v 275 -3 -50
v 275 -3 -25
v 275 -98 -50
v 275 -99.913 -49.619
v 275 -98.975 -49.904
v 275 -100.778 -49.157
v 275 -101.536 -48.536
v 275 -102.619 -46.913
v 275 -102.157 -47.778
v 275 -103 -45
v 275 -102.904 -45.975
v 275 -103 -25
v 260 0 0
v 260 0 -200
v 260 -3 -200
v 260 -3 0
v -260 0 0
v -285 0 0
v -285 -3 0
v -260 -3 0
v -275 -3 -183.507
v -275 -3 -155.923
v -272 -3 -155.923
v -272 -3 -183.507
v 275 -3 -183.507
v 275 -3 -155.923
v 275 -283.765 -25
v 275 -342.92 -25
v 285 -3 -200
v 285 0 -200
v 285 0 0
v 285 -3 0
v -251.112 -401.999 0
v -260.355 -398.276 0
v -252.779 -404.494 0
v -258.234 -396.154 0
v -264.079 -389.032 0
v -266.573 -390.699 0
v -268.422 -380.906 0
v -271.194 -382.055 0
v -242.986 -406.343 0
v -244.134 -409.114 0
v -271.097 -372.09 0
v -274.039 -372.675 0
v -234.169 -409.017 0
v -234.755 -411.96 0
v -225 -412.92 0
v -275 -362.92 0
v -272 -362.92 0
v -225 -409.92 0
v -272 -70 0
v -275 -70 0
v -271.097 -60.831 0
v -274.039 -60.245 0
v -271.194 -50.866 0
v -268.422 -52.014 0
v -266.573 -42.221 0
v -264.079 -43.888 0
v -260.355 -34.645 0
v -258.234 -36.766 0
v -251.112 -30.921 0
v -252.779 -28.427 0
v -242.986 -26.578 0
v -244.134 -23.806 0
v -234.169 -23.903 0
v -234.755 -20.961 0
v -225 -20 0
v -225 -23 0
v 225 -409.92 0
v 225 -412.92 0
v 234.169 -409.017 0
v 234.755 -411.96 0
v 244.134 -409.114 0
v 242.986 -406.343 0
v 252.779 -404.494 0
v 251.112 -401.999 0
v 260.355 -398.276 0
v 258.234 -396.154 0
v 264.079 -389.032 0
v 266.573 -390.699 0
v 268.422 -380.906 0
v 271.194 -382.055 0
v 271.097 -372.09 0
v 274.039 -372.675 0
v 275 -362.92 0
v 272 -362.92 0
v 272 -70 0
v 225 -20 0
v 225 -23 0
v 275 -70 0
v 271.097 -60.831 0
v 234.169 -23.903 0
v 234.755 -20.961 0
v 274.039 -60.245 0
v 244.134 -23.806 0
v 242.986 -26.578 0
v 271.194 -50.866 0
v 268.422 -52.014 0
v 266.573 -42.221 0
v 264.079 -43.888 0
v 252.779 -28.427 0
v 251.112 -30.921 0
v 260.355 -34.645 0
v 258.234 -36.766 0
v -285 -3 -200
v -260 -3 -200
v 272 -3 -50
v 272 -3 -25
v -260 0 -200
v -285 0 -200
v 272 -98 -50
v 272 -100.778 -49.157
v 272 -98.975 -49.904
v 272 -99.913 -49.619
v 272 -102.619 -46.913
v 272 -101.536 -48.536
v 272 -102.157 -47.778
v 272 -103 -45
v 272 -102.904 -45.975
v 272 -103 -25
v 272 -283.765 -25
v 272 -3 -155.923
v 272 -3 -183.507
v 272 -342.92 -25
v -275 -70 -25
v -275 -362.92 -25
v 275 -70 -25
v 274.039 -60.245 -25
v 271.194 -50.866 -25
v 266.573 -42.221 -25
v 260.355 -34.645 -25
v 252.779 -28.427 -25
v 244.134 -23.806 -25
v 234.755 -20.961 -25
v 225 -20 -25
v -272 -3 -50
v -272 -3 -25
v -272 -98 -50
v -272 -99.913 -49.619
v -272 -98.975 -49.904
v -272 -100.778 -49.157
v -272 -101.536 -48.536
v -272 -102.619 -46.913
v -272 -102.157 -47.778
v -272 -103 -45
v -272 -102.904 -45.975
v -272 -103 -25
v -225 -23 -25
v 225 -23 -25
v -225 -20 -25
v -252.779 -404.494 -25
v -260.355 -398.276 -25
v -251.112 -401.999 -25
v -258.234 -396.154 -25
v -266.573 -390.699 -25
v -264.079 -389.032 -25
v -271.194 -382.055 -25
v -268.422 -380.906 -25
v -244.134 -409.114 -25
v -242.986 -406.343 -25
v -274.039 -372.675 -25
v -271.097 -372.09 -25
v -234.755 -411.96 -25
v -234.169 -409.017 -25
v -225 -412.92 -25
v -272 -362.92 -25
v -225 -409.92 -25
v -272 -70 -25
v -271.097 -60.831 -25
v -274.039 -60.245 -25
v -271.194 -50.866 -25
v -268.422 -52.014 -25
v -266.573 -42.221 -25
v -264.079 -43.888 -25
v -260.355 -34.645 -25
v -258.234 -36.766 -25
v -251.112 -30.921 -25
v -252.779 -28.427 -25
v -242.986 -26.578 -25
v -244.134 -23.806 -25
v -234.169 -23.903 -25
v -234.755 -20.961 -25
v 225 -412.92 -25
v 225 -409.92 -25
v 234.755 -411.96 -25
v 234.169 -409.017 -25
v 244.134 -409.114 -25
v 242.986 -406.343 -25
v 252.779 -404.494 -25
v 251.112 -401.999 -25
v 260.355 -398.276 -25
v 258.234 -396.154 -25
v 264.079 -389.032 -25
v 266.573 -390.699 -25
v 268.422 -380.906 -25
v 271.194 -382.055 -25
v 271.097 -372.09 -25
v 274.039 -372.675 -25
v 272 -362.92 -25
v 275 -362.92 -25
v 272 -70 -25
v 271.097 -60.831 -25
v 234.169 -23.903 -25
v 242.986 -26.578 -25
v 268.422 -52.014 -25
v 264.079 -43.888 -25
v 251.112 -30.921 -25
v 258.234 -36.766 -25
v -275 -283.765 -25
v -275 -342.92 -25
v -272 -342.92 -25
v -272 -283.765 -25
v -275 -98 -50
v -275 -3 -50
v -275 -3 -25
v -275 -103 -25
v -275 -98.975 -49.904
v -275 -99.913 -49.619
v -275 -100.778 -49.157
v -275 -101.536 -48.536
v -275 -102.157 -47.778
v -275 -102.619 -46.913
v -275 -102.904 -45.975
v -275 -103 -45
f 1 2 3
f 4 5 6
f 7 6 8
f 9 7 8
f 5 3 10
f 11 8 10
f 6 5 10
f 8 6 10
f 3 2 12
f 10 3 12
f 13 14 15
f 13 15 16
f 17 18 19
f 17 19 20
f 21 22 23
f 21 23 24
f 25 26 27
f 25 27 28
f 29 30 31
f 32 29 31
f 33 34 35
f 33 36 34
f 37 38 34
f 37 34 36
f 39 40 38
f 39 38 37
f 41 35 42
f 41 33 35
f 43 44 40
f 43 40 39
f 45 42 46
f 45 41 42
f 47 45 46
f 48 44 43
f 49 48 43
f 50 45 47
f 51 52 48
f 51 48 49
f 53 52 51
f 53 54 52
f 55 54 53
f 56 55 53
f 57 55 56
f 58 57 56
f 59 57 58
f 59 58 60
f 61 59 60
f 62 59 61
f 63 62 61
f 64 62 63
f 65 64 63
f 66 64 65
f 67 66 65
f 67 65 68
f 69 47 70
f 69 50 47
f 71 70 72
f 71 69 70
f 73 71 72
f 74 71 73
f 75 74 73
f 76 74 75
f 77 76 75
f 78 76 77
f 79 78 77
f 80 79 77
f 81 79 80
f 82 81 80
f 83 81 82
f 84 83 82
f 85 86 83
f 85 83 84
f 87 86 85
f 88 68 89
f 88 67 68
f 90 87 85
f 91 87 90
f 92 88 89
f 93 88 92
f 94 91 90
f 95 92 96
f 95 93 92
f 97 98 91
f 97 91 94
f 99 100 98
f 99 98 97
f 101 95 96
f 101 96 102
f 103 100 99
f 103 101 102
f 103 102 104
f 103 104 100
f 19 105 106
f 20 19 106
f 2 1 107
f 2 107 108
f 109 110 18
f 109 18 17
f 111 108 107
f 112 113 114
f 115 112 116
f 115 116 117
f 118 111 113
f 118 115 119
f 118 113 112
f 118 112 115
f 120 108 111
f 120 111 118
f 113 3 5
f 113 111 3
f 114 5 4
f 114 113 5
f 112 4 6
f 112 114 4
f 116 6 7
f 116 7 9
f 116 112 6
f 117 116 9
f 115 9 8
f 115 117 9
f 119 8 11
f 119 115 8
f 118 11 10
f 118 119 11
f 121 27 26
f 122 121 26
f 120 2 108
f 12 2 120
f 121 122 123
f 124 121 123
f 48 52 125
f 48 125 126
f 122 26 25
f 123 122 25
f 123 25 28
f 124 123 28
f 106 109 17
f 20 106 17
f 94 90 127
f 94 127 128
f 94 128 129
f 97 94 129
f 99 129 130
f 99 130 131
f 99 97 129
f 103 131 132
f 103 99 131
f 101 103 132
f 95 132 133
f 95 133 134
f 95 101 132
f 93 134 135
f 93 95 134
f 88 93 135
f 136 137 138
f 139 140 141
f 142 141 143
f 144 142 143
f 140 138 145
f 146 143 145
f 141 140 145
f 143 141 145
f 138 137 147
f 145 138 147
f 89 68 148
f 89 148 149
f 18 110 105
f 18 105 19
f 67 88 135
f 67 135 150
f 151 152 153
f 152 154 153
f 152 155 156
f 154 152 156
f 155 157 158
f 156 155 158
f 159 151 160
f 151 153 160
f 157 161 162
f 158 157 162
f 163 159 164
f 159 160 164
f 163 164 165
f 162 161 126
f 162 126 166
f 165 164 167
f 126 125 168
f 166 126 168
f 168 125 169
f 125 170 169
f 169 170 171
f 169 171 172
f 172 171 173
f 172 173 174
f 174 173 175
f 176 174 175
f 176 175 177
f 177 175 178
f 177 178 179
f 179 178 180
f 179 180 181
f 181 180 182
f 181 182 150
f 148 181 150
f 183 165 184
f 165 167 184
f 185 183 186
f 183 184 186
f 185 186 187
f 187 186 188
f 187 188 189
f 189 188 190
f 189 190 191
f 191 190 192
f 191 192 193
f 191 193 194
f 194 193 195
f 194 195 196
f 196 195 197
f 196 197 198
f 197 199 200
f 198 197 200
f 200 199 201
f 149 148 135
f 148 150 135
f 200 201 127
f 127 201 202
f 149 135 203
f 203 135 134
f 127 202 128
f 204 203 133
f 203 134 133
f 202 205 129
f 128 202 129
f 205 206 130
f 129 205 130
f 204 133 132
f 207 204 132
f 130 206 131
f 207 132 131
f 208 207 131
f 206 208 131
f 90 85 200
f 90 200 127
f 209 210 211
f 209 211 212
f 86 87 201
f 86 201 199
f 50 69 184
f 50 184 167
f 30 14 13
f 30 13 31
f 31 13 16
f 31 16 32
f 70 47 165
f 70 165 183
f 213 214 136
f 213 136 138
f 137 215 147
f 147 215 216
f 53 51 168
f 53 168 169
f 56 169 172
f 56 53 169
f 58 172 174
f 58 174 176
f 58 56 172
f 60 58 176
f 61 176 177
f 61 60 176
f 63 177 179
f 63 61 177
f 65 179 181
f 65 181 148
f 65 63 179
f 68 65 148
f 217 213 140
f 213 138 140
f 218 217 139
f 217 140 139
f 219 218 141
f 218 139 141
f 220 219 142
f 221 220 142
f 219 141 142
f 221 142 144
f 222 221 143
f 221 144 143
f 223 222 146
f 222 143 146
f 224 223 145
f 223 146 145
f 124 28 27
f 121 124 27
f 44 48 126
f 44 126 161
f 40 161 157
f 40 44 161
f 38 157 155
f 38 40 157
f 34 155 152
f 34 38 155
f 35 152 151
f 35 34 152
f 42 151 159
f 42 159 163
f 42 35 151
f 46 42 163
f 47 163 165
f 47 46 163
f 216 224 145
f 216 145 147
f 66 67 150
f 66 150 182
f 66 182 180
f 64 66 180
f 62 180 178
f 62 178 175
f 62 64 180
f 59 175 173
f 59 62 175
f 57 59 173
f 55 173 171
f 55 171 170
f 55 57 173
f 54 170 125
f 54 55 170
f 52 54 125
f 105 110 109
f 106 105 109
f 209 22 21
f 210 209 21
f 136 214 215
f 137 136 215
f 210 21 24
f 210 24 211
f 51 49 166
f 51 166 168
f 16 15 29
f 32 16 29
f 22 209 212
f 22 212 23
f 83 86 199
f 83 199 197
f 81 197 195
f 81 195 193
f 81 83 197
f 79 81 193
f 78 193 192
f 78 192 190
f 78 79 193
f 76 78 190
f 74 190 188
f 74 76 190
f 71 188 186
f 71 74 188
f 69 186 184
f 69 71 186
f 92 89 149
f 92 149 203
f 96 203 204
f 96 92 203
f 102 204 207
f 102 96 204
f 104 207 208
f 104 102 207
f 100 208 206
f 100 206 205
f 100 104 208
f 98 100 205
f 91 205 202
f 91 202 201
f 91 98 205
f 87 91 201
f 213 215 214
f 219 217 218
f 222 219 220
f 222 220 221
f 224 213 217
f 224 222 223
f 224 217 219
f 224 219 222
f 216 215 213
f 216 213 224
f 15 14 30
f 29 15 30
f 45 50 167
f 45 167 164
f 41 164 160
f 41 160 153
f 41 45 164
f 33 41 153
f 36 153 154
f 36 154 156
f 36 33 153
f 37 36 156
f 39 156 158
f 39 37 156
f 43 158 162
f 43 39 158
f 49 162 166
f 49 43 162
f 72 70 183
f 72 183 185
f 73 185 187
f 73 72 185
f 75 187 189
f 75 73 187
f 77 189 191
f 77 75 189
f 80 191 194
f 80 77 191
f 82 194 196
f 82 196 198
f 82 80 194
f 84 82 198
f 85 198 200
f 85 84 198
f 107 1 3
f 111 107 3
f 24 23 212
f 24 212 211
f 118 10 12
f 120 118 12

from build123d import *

# Parameters (mm, degrees)
F1_DEPTH = 25
F2_W     = 25
F2_H     = 200
F3_DEPTH = 3
F4_W     = 100
F4_H     = 25
F5_DEPTH = 3
F6_R     = 5


with BuildPart() as f1:
    # F0 (on Top) → F1 (new body)
    with BuildSketch(Plane.XY):
        with BuildLine():
            Line((225, -20), (-225, -20))
            ThreePointArc((-225, -20), (-260.355339, -34.644661), (-275, -70))
            Line((-275, -70), (-275, -362.920367))
            ThreePointArc((-275, -362.920367), (-260.355339, -398.275706), (-225, -412.920367))
            Line((-225, -412.920367), (225, -412.920367))
            ThreePointArc((225, -412.920367), (260.355339, -398.275706), (275, -362.920367))
            Line((275, -362.920367), (275, -70))
            ThreePointArc((275, -70), (260.355339, -34.644661), (225, -20))
        make_face()
        with BuildLine():
            ThreePointArc((-272, -70), (-258.234019, -36.765981), (-225, -23))
            Line((-225, -23), (225, -23))
            ThreePointArc((225, -23), (258.234019, -36.765981), (272, -70))
            Line((272, -70), (272, -362.920367))
            ThreePointArc((272, -362.920367), (258.234019, -396.154386), (225, -409.920367))
            Line((225, -409.920367), (-225, -409.920367))
            ThreePointArc((-225, -409.920367), (-258.234019, -396.154386), (-272, -362.920367))
            Line((-272, -362.920367), (-272, -70))
        make_face(mode=Mode.SUBTRACT)
    extrude(amount=-F1_DEPTH)


with BuildPart() as f3:
    # F2 (on Front) → F3 (new body)
    with BuildSketch(Plane.XZ):
        with Locations((-272.5, -100)):
            Rectangle(F2_W, F2_H)
        with Locations((272.5, -100)):
            Rectangle(F2_W, F2_H)
    extrude(amount=F3_DEPTH)


with BuildPart() as f5:
    # F4 (on face) → F5 (new body)
    with BuildSketch(Plane(origin=(-275, 0, 0), x_dir=(0, -1, 0), z_dir=(-1, 0, 0))):
        with Locations((53, -37.5)):
            Rectangle(F4_W, F4_H)
        Polygon((283.765328, -25), (3, -155.923022), (3, -183.50747), (342.920367, -25), align=None)
    extrude(amount=-F5_DEPTH)

    # F6
    f6_edges = [f5.edges().sort_by_distance(p)[0] for p in [
        (-273.5, -103, -50),
    ]]
    fillet(f6_edges, radius=F6_R)


with BuildPart() as f7_1:
    # F7: instance of F5
    add(f5.part.mirror(Plane.YZ))


solid = Compound([f1.part, f3.part, f5.part, f7_1.part])
